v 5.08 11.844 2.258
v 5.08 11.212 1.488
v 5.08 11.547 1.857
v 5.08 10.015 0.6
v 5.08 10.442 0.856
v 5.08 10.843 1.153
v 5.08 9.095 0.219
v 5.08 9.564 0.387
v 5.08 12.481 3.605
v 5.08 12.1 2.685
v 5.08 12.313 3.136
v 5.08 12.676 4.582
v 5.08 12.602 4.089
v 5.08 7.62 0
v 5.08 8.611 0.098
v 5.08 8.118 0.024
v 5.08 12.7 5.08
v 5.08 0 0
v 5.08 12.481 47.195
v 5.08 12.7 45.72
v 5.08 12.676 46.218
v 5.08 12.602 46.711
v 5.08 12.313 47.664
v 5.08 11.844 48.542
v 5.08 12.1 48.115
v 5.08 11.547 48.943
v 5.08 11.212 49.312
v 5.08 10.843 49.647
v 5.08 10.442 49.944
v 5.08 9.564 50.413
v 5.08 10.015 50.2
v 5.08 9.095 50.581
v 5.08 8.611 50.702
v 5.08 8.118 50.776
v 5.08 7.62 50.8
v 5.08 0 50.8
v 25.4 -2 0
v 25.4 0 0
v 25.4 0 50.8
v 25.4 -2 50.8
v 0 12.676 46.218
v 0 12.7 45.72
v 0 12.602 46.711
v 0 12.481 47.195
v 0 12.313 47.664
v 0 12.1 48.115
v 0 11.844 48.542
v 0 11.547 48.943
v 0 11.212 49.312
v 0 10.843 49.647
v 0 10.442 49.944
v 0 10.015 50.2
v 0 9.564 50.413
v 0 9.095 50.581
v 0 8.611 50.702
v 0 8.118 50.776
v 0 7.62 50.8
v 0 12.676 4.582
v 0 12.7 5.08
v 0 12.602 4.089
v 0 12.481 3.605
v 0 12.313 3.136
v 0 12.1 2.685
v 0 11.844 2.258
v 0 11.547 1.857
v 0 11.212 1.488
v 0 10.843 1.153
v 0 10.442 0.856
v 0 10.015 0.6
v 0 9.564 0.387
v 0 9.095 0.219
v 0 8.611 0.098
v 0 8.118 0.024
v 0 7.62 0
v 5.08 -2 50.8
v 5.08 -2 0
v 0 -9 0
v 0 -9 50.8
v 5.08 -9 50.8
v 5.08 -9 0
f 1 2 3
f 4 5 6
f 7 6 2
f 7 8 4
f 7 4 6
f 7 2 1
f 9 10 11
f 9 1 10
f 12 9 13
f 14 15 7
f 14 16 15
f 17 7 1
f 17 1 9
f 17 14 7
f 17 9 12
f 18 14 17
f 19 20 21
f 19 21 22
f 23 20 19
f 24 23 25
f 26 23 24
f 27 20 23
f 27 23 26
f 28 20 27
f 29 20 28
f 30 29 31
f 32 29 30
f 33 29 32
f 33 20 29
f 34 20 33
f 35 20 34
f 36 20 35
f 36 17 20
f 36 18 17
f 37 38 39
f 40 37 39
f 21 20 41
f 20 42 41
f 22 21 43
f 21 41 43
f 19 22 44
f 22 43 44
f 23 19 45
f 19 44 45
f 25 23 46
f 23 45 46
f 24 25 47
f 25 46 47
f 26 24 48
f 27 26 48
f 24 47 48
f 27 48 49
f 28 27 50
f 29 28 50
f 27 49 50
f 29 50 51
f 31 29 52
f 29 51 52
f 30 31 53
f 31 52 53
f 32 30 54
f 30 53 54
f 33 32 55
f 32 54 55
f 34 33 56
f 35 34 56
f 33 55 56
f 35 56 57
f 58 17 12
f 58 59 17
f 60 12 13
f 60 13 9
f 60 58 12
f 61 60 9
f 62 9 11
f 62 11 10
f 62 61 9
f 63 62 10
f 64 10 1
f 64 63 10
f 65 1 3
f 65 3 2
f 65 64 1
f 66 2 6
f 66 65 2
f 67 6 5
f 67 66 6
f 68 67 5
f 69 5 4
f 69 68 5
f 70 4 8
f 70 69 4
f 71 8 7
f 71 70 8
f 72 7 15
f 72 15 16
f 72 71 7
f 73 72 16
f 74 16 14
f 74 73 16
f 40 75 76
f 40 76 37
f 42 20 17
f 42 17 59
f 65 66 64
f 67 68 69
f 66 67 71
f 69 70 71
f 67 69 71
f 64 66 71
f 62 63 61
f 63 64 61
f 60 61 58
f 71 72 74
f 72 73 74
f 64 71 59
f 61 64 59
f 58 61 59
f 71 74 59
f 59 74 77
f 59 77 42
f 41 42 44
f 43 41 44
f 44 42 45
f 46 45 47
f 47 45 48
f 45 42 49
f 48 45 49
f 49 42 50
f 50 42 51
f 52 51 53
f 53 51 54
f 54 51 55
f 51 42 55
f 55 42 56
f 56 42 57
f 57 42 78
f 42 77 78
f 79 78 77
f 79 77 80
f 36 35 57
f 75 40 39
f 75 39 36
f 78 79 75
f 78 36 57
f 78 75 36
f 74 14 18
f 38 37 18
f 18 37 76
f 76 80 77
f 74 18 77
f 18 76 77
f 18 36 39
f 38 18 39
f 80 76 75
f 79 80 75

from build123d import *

# Parameters (mm, degrees)
F0_W     = 25.4
F0_H     = 50.8
F1_DEPTH = 2
F2_W     = 5.08
F2_H     = 50.8
F3_DEPTH = 7
F4_W     = 5.08
F4_H     = 50.8
F5_DEPTH = 12.7
F6_R     = 5.08


with BuildPart() as f1:
    # F0 (on Front) → F1 (new body)
    with BuildSketch(Plane.XZ):
        with Locations((12.7, 25.4)):
            Rectangle(F0_W, F0_H)
    extrude(amount=F1_DEPTH)

    # F2 (on face) → F3 (join)
    with BuildSketch(Plane.XZ.offset(2)):
        with Locations((2.54, 25.4)):
            Rectangle(F2_W, F2_H)
    extrude(amount=F3_DEPTH)

    # F4 (on face) → F5 (join)
    with BuildSketch(Plane(origin=(0, 0, 0), x_dir=(-1, 0, 0), z_dir=(0, 1, 0))):
        with Locations((-2.54, 25.4)):
            Rectangle(F4_W, F4_H)
    extrude(amount=F5_DEPTH)

    # F6
    f6_edges = [f1.edges().sort_by_distance(p)[0] for p in [
        (2.54, 12.7, 50.8),
        (2.54, 12.7, 0),
    ]]
    fillet(f6_edges, radius=F6_R)


solid = f1.part
